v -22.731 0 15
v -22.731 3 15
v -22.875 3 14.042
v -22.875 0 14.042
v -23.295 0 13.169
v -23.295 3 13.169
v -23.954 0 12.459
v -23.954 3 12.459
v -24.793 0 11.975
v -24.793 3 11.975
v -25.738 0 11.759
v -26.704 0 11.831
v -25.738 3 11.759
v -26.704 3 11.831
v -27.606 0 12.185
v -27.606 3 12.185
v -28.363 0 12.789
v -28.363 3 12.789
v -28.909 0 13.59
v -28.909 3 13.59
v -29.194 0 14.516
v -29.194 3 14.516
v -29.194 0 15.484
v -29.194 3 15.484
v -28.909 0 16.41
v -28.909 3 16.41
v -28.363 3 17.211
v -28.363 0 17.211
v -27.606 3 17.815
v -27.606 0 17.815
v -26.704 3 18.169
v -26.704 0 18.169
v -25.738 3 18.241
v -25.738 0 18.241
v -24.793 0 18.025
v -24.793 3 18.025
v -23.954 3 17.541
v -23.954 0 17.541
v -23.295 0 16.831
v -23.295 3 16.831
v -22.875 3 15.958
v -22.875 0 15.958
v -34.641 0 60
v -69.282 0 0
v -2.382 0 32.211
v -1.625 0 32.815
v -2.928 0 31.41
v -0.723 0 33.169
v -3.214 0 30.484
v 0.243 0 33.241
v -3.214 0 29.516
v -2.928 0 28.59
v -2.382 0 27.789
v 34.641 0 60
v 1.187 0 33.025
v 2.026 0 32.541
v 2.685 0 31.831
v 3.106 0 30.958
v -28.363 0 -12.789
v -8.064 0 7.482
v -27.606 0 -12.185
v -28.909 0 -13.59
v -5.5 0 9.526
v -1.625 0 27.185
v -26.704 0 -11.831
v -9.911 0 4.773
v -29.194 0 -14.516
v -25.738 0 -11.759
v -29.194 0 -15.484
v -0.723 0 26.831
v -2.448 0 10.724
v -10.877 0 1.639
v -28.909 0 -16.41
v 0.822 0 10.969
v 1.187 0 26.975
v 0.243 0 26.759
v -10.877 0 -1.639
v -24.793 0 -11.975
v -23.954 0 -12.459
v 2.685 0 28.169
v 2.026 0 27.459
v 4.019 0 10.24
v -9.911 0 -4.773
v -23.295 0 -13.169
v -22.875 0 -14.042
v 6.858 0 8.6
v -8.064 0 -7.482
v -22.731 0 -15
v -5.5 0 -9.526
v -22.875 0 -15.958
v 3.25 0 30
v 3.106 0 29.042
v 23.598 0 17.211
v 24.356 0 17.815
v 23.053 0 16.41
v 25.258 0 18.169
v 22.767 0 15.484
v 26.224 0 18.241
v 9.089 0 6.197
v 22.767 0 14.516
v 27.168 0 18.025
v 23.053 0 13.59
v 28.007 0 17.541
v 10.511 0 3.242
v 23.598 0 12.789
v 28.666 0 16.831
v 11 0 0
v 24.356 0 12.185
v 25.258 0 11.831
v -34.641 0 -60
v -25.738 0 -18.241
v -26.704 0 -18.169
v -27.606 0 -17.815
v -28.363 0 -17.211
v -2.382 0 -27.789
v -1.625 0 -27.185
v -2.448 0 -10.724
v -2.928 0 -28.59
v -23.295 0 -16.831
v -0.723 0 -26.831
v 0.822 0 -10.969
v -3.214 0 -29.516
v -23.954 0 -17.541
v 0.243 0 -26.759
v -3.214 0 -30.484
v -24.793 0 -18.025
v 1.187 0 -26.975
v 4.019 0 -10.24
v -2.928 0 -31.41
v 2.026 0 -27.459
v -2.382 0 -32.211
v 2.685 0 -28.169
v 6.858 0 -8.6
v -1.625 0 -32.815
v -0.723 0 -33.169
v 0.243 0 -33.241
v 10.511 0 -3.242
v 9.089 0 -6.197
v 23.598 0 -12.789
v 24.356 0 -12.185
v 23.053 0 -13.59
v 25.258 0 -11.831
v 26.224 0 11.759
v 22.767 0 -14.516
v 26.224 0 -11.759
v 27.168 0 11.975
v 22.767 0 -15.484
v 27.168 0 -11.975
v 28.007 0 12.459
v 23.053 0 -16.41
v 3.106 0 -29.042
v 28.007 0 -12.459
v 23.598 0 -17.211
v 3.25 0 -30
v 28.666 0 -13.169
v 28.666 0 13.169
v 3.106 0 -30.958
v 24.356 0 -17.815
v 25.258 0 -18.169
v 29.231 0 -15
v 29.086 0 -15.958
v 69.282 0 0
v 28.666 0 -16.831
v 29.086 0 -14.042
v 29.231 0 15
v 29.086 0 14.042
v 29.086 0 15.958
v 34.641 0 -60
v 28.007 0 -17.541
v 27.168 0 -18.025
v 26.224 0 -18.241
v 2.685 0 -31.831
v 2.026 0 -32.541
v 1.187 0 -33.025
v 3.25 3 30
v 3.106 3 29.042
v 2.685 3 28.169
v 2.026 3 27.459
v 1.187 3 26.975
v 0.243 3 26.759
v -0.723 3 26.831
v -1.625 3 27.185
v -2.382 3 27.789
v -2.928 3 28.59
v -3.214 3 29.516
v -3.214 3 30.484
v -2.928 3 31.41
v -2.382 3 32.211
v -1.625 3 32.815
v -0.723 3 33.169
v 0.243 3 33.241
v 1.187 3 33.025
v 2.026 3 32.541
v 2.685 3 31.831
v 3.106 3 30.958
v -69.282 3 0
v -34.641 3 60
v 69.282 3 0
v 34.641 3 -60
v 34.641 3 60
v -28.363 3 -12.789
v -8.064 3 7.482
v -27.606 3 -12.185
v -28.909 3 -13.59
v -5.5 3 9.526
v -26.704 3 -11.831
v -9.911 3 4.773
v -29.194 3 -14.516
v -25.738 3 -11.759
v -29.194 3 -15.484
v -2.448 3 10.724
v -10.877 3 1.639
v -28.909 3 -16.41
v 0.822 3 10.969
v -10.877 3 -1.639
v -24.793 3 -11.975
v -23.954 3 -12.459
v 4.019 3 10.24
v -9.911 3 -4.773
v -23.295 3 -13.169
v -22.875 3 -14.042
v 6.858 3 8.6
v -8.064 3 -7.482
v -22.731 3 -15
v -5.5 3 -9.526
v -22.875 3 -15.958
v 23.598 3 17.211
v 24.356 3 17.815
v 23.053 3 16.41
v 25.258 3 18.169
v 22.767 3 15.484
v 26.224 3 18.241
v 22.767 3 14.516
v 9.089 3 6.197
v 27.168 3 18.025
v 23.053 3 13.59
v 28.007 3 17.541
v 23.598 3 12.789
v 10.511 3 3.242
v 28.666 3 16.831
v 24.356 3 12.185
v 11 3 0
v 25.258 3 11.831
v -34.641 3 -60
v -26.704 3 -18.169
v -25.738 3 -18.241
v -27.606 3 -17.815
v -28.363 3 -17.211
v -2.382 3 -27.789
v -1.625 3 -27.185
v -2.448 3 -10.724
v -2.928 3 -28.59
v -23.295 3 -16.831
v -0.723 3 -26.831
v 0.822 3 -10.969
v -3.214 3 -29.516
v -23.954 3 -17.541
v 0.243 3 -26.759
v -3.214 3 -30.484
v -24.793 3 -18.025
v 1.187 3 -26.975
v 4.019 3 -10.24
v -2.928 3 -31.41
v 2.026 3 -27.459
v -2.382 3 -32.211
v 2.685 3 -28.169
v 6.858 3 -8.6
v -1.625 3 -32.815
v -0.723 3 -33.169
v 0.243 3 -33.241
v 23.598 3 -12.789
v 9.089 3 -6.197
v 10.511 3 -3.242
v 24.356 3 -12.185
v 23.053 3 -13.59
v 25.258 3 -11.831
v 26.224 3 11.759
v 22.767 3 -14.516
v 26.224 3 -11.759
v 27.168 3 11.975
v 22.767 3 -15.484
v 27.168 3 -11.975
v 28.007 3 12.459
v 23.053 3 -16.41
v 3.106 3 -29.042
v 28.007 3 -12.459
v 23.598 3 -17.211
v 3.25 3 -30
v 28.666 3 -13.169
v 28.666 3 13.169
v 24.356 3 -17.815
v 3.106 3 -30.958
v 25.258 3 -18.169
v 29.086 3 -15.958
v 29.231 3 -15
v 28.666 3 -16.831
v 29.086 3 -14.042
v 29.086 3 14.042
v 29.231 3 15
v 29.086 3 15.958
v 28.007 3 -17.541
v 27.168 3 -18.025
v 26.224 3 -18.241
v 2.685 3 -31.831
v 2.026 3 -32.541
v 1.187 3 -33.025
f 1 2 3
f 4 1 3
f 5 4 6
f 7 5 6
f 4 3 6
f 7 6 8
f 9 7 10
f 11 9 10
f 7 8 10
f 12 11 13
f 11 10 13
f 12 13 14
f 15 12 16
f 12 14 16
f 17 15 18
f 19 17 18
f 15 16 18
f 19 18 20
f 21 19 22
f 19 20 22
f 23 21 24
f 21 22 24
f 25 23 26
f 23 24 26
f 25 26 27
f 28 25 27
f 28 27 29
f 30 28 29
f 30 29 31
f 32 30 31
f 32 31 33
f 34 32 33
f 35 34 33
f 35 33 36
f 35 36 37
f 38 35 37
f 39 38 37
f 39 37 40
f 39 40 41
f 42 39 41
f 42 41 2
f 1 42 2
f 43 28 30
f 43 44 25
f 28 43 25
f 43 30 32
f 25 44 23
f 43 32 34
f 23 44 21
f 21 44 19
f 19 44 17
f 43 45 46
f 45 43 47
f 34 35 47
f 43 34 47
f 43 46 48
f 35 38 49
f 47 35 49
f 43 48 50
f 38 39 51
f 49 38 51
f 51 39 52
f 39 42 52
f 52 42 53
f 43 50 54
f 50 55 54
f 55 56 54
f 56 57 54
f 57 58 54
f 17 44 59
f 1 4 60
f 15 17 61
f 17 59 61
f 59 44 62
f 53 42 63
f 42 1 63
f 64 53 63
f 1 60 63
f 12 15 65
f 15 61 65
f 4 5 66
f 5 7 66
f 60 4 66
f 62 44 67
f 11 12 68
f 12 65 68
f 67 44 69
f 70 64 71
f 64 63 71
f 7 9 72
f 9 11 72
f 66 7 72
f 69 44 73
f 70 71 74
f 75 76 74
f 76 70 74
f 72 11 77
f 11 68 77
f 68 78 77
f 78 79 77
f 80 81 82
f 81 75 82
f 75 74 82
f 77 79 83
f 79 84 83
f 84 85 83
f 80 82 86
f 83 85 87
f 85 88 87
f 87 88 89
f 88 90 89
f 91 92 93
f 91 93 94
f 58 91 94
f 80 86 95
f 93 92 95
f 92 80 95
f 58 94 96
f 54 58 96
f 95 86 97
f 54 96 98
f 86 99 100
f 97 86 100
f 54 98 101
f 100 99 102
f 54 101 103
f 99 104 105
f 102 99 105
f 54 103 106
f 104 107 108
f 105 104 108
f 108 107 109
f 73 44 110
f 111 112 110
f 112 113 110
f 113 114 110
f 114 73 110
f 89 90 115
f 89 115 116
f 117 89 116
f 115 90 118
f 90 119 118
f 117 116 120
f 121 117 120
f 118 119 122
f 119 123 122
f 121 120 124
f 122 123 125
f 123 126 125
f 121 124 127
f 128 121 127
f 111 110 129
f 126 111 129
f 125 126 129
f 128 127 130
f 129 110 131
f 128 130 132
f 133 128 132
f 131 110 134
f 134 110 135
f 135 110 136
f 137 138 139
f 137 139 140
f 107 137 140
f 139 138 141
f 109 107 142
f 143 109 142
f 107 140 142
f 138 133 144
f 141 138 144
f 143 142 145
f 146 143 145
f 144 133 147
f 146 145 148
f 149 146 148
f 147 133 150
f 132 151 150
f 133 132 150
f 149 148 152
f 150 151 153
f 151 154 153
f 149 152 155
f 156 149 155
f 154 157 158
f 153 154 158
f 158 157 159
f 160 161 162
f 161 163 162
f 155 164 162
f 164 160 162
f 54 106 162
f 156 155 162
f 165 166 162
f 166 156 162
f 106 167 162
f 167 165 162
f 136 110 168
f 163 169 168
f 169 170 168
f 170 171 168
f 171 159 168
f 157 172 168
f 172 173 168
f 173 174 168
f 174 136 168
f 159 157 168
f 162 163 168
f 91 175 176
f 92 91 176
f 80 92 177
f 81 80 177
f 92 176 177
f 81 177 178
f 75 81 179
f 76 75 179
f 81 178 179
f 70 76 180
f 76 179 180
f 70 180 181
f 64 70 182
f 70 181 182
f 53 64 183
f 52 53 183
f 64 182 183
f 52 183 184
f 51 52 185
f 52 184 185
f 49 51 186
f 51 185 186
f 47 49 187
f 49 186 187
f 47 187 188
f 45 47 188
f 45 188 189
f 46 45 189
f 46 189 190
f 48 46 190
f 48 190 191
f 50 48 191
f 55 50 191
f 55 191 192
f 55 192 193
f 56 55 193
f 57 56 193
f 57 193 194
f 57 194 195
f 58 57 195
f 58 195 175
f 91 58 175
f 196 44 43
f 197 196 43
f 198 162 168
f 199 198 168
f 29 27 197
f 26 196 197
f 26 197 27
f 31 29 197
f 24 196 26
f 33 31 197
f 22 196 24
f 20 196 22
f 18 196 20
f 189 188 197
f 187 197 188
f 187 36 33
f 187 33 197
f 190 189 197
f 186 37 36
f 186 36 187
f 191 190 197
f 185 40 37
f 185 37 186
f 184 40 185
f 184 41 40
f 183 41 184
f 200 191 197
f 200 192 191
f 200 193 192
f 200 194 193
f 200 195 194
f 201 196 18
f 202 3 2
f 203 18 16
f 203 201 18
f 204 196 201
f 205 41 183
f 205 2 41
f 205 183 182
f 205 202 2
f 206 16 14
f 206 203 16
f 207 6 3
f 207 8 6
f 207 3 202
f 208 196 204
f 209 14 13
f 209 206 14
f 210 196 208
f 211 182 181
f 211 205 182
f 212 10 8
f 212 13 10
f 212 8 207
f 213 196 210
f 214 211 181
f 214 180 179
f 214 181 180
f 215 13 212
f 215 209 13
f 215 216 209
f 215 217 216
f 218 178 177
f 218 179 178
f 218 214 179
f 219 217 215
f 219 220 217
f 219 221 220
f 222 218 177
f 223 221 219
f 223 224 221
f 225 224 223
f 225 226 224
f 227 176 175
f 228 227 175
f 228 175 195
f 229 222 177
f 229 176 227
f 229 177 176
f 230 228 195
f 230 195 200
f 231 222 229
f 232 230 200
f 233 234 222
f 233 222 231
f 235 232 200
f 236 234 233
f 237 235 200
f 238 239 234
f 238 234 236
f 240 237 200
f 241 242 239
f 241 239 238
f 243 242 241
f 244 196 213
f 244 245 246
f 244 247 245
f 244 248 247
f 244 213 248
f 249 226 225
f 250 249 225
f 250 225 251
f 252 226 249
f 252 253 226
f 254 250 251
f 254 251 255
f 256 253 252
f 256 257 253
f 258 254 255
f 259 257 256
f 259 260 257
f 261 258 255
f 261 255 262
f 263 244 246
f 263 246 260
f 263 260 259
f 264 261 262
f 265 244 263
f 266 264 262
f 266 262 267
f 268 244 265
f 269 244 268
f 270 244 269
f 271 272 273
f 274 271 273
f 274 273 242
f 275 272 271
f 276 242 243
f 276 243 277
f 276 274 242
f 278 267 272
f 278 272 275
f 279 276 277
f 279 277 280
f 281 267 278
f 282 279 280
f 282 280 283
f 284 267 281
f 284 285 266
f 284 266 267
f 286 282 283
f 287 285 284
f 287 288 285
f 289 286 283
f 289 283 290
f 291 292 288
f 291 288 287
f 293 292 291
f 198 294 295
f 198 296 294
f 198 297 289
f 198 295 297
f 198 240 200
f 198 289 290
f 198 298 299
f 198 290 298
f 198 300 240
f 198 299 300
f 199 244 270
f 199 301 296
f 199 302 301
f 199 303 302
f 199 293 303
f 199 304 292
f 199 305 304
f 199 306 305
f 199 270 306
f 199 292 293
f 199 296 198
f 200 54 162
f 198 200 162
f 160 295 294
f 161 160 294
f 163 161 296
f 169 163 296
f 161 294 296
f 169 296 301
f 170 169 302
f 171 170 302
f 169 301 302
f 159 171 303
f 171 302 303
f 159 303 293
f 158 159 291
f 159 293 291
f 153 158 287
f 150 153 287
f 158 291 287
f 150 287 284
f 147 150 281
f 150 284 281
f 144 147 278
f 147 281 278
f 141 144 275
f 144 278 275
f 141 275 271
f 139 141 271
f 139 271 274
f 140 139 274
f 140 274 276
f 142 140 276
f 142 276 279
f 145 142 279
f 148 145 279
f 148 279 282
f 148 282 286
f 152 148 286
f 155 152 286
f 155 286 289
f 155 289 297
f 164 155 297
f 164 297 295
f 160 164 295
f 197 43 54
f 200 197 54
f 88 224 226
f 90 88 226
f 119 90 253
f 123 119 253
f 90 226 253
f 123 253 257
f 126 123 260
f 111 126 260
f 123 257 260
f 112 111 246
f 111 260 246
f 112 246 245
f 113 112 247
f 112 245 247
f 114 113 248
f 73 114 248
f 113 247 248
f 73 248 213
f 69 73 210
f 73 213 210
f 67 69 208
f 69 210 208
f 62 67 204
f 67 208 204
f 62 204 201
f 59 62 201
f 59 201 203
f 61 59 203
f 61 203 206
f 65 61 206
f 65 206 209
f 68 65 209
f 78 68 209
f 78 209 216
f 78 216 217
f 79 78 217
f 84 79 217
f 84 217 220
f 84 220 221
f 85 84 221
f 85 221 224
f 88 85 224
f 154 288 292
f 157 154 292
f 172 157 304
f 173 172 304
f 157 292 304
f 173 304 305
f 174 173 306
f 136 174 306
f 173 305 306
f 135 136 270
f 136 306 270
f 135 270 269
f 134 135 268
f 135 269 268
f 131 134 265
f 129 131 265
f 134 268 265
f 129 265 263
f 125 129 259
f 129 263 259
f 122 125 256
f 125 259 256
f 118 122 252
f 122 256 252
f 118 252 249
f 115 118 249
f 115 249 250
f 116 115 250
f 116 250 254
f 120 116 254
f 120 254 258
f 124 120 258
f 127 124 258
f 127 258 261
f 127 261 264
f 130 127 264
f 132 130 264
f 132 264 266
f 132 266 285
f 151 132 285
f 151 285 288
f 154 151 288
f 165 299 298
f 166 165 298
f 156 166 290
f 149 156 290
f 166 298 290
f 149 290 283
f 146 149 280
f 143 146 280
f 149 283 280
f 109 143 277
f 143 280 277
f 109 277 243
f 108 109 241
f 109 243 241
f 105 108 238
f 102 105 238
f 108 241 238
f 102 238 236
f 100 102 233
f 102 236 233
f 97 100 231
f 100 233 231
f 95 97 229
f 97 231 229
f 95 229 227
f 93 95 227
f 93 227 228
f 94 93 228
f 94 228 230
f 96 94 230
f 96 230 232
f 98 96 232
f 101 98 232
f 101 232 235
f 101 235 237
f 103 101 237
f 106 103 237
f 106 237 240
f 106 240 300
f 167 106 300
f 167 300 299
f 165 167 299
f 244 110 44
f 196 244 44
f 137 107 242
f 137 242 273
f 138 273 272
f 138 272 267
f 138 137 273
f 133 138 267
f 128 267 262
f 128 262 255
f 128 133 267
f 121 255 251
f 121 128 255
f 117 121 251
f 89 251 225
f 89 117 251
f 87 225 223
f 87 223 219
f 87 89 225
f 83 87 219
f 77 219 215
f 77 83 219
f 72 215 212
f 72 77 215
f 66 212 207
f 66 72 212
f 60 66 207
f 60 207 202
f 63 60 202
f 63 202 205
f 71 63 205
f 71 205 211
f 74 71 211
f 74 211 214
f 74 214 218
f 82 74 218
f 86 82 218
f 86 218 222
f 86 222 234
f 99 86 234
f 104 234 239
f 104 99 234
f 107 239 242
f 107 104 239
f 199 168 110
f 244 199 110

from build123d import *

# Parameters (mm, degrees)
CROQUIS1_R              = 11
SALIENTE_EXTRUIR1_DEPTH = 3
CROQUIS2_R              = 3.25
CORTAR_EXTRUIR1_DEPTH   = 4


with BuildPart() as part:
    # Croquis1 → Saliente-Extruir1 (new body)
    with BuildSketch(Plane(origin=(0, 0, 0), x_dir=(1, 0, 0), z_dir=(0, 1, 0))):
        Polygon((69.282032303, 0), (34.641016151, 60), (-34.641016151, 60), (-69.282032303, 0), (-34.641016151, -60), (34.641016151, -60), align=None)
        Circle(CROQUIS1_R, mode=Mode.SUBTRACT)
    extrude(amount=SALIENTE_EXTRUIR1_DEPTH)

    # Croquis2 → Cortar-Extruir1 (cut, through all)
    with BuildSketch(Plane(origin=(0, 3, 0), x_dir=(1, 0, 0), z_dir=(0, 1, 0))):
        with Locations((0, 30)):
            Circle(CROQUIS2_R)
        with Locations((25.980762114, 15)):
            Circle(CROQUIS2_R)
        with Locations((25.980762114, -15)):
            Circle(CROQUIS2_R)
        with Locations((0, -30)):
            Circle(CROQUIS2_R)
        with Locations((-25.980762114, -15)):
            Circle(CROQUIS2_R)
        with Locations((-25.980762114, 15)):
            Circle(CROQUIS2_R)
    extrude(amount=-CORTAR_EXTRUIR1_DEPTH, mode=Mode.SUBTRACT)


solid = part.part
